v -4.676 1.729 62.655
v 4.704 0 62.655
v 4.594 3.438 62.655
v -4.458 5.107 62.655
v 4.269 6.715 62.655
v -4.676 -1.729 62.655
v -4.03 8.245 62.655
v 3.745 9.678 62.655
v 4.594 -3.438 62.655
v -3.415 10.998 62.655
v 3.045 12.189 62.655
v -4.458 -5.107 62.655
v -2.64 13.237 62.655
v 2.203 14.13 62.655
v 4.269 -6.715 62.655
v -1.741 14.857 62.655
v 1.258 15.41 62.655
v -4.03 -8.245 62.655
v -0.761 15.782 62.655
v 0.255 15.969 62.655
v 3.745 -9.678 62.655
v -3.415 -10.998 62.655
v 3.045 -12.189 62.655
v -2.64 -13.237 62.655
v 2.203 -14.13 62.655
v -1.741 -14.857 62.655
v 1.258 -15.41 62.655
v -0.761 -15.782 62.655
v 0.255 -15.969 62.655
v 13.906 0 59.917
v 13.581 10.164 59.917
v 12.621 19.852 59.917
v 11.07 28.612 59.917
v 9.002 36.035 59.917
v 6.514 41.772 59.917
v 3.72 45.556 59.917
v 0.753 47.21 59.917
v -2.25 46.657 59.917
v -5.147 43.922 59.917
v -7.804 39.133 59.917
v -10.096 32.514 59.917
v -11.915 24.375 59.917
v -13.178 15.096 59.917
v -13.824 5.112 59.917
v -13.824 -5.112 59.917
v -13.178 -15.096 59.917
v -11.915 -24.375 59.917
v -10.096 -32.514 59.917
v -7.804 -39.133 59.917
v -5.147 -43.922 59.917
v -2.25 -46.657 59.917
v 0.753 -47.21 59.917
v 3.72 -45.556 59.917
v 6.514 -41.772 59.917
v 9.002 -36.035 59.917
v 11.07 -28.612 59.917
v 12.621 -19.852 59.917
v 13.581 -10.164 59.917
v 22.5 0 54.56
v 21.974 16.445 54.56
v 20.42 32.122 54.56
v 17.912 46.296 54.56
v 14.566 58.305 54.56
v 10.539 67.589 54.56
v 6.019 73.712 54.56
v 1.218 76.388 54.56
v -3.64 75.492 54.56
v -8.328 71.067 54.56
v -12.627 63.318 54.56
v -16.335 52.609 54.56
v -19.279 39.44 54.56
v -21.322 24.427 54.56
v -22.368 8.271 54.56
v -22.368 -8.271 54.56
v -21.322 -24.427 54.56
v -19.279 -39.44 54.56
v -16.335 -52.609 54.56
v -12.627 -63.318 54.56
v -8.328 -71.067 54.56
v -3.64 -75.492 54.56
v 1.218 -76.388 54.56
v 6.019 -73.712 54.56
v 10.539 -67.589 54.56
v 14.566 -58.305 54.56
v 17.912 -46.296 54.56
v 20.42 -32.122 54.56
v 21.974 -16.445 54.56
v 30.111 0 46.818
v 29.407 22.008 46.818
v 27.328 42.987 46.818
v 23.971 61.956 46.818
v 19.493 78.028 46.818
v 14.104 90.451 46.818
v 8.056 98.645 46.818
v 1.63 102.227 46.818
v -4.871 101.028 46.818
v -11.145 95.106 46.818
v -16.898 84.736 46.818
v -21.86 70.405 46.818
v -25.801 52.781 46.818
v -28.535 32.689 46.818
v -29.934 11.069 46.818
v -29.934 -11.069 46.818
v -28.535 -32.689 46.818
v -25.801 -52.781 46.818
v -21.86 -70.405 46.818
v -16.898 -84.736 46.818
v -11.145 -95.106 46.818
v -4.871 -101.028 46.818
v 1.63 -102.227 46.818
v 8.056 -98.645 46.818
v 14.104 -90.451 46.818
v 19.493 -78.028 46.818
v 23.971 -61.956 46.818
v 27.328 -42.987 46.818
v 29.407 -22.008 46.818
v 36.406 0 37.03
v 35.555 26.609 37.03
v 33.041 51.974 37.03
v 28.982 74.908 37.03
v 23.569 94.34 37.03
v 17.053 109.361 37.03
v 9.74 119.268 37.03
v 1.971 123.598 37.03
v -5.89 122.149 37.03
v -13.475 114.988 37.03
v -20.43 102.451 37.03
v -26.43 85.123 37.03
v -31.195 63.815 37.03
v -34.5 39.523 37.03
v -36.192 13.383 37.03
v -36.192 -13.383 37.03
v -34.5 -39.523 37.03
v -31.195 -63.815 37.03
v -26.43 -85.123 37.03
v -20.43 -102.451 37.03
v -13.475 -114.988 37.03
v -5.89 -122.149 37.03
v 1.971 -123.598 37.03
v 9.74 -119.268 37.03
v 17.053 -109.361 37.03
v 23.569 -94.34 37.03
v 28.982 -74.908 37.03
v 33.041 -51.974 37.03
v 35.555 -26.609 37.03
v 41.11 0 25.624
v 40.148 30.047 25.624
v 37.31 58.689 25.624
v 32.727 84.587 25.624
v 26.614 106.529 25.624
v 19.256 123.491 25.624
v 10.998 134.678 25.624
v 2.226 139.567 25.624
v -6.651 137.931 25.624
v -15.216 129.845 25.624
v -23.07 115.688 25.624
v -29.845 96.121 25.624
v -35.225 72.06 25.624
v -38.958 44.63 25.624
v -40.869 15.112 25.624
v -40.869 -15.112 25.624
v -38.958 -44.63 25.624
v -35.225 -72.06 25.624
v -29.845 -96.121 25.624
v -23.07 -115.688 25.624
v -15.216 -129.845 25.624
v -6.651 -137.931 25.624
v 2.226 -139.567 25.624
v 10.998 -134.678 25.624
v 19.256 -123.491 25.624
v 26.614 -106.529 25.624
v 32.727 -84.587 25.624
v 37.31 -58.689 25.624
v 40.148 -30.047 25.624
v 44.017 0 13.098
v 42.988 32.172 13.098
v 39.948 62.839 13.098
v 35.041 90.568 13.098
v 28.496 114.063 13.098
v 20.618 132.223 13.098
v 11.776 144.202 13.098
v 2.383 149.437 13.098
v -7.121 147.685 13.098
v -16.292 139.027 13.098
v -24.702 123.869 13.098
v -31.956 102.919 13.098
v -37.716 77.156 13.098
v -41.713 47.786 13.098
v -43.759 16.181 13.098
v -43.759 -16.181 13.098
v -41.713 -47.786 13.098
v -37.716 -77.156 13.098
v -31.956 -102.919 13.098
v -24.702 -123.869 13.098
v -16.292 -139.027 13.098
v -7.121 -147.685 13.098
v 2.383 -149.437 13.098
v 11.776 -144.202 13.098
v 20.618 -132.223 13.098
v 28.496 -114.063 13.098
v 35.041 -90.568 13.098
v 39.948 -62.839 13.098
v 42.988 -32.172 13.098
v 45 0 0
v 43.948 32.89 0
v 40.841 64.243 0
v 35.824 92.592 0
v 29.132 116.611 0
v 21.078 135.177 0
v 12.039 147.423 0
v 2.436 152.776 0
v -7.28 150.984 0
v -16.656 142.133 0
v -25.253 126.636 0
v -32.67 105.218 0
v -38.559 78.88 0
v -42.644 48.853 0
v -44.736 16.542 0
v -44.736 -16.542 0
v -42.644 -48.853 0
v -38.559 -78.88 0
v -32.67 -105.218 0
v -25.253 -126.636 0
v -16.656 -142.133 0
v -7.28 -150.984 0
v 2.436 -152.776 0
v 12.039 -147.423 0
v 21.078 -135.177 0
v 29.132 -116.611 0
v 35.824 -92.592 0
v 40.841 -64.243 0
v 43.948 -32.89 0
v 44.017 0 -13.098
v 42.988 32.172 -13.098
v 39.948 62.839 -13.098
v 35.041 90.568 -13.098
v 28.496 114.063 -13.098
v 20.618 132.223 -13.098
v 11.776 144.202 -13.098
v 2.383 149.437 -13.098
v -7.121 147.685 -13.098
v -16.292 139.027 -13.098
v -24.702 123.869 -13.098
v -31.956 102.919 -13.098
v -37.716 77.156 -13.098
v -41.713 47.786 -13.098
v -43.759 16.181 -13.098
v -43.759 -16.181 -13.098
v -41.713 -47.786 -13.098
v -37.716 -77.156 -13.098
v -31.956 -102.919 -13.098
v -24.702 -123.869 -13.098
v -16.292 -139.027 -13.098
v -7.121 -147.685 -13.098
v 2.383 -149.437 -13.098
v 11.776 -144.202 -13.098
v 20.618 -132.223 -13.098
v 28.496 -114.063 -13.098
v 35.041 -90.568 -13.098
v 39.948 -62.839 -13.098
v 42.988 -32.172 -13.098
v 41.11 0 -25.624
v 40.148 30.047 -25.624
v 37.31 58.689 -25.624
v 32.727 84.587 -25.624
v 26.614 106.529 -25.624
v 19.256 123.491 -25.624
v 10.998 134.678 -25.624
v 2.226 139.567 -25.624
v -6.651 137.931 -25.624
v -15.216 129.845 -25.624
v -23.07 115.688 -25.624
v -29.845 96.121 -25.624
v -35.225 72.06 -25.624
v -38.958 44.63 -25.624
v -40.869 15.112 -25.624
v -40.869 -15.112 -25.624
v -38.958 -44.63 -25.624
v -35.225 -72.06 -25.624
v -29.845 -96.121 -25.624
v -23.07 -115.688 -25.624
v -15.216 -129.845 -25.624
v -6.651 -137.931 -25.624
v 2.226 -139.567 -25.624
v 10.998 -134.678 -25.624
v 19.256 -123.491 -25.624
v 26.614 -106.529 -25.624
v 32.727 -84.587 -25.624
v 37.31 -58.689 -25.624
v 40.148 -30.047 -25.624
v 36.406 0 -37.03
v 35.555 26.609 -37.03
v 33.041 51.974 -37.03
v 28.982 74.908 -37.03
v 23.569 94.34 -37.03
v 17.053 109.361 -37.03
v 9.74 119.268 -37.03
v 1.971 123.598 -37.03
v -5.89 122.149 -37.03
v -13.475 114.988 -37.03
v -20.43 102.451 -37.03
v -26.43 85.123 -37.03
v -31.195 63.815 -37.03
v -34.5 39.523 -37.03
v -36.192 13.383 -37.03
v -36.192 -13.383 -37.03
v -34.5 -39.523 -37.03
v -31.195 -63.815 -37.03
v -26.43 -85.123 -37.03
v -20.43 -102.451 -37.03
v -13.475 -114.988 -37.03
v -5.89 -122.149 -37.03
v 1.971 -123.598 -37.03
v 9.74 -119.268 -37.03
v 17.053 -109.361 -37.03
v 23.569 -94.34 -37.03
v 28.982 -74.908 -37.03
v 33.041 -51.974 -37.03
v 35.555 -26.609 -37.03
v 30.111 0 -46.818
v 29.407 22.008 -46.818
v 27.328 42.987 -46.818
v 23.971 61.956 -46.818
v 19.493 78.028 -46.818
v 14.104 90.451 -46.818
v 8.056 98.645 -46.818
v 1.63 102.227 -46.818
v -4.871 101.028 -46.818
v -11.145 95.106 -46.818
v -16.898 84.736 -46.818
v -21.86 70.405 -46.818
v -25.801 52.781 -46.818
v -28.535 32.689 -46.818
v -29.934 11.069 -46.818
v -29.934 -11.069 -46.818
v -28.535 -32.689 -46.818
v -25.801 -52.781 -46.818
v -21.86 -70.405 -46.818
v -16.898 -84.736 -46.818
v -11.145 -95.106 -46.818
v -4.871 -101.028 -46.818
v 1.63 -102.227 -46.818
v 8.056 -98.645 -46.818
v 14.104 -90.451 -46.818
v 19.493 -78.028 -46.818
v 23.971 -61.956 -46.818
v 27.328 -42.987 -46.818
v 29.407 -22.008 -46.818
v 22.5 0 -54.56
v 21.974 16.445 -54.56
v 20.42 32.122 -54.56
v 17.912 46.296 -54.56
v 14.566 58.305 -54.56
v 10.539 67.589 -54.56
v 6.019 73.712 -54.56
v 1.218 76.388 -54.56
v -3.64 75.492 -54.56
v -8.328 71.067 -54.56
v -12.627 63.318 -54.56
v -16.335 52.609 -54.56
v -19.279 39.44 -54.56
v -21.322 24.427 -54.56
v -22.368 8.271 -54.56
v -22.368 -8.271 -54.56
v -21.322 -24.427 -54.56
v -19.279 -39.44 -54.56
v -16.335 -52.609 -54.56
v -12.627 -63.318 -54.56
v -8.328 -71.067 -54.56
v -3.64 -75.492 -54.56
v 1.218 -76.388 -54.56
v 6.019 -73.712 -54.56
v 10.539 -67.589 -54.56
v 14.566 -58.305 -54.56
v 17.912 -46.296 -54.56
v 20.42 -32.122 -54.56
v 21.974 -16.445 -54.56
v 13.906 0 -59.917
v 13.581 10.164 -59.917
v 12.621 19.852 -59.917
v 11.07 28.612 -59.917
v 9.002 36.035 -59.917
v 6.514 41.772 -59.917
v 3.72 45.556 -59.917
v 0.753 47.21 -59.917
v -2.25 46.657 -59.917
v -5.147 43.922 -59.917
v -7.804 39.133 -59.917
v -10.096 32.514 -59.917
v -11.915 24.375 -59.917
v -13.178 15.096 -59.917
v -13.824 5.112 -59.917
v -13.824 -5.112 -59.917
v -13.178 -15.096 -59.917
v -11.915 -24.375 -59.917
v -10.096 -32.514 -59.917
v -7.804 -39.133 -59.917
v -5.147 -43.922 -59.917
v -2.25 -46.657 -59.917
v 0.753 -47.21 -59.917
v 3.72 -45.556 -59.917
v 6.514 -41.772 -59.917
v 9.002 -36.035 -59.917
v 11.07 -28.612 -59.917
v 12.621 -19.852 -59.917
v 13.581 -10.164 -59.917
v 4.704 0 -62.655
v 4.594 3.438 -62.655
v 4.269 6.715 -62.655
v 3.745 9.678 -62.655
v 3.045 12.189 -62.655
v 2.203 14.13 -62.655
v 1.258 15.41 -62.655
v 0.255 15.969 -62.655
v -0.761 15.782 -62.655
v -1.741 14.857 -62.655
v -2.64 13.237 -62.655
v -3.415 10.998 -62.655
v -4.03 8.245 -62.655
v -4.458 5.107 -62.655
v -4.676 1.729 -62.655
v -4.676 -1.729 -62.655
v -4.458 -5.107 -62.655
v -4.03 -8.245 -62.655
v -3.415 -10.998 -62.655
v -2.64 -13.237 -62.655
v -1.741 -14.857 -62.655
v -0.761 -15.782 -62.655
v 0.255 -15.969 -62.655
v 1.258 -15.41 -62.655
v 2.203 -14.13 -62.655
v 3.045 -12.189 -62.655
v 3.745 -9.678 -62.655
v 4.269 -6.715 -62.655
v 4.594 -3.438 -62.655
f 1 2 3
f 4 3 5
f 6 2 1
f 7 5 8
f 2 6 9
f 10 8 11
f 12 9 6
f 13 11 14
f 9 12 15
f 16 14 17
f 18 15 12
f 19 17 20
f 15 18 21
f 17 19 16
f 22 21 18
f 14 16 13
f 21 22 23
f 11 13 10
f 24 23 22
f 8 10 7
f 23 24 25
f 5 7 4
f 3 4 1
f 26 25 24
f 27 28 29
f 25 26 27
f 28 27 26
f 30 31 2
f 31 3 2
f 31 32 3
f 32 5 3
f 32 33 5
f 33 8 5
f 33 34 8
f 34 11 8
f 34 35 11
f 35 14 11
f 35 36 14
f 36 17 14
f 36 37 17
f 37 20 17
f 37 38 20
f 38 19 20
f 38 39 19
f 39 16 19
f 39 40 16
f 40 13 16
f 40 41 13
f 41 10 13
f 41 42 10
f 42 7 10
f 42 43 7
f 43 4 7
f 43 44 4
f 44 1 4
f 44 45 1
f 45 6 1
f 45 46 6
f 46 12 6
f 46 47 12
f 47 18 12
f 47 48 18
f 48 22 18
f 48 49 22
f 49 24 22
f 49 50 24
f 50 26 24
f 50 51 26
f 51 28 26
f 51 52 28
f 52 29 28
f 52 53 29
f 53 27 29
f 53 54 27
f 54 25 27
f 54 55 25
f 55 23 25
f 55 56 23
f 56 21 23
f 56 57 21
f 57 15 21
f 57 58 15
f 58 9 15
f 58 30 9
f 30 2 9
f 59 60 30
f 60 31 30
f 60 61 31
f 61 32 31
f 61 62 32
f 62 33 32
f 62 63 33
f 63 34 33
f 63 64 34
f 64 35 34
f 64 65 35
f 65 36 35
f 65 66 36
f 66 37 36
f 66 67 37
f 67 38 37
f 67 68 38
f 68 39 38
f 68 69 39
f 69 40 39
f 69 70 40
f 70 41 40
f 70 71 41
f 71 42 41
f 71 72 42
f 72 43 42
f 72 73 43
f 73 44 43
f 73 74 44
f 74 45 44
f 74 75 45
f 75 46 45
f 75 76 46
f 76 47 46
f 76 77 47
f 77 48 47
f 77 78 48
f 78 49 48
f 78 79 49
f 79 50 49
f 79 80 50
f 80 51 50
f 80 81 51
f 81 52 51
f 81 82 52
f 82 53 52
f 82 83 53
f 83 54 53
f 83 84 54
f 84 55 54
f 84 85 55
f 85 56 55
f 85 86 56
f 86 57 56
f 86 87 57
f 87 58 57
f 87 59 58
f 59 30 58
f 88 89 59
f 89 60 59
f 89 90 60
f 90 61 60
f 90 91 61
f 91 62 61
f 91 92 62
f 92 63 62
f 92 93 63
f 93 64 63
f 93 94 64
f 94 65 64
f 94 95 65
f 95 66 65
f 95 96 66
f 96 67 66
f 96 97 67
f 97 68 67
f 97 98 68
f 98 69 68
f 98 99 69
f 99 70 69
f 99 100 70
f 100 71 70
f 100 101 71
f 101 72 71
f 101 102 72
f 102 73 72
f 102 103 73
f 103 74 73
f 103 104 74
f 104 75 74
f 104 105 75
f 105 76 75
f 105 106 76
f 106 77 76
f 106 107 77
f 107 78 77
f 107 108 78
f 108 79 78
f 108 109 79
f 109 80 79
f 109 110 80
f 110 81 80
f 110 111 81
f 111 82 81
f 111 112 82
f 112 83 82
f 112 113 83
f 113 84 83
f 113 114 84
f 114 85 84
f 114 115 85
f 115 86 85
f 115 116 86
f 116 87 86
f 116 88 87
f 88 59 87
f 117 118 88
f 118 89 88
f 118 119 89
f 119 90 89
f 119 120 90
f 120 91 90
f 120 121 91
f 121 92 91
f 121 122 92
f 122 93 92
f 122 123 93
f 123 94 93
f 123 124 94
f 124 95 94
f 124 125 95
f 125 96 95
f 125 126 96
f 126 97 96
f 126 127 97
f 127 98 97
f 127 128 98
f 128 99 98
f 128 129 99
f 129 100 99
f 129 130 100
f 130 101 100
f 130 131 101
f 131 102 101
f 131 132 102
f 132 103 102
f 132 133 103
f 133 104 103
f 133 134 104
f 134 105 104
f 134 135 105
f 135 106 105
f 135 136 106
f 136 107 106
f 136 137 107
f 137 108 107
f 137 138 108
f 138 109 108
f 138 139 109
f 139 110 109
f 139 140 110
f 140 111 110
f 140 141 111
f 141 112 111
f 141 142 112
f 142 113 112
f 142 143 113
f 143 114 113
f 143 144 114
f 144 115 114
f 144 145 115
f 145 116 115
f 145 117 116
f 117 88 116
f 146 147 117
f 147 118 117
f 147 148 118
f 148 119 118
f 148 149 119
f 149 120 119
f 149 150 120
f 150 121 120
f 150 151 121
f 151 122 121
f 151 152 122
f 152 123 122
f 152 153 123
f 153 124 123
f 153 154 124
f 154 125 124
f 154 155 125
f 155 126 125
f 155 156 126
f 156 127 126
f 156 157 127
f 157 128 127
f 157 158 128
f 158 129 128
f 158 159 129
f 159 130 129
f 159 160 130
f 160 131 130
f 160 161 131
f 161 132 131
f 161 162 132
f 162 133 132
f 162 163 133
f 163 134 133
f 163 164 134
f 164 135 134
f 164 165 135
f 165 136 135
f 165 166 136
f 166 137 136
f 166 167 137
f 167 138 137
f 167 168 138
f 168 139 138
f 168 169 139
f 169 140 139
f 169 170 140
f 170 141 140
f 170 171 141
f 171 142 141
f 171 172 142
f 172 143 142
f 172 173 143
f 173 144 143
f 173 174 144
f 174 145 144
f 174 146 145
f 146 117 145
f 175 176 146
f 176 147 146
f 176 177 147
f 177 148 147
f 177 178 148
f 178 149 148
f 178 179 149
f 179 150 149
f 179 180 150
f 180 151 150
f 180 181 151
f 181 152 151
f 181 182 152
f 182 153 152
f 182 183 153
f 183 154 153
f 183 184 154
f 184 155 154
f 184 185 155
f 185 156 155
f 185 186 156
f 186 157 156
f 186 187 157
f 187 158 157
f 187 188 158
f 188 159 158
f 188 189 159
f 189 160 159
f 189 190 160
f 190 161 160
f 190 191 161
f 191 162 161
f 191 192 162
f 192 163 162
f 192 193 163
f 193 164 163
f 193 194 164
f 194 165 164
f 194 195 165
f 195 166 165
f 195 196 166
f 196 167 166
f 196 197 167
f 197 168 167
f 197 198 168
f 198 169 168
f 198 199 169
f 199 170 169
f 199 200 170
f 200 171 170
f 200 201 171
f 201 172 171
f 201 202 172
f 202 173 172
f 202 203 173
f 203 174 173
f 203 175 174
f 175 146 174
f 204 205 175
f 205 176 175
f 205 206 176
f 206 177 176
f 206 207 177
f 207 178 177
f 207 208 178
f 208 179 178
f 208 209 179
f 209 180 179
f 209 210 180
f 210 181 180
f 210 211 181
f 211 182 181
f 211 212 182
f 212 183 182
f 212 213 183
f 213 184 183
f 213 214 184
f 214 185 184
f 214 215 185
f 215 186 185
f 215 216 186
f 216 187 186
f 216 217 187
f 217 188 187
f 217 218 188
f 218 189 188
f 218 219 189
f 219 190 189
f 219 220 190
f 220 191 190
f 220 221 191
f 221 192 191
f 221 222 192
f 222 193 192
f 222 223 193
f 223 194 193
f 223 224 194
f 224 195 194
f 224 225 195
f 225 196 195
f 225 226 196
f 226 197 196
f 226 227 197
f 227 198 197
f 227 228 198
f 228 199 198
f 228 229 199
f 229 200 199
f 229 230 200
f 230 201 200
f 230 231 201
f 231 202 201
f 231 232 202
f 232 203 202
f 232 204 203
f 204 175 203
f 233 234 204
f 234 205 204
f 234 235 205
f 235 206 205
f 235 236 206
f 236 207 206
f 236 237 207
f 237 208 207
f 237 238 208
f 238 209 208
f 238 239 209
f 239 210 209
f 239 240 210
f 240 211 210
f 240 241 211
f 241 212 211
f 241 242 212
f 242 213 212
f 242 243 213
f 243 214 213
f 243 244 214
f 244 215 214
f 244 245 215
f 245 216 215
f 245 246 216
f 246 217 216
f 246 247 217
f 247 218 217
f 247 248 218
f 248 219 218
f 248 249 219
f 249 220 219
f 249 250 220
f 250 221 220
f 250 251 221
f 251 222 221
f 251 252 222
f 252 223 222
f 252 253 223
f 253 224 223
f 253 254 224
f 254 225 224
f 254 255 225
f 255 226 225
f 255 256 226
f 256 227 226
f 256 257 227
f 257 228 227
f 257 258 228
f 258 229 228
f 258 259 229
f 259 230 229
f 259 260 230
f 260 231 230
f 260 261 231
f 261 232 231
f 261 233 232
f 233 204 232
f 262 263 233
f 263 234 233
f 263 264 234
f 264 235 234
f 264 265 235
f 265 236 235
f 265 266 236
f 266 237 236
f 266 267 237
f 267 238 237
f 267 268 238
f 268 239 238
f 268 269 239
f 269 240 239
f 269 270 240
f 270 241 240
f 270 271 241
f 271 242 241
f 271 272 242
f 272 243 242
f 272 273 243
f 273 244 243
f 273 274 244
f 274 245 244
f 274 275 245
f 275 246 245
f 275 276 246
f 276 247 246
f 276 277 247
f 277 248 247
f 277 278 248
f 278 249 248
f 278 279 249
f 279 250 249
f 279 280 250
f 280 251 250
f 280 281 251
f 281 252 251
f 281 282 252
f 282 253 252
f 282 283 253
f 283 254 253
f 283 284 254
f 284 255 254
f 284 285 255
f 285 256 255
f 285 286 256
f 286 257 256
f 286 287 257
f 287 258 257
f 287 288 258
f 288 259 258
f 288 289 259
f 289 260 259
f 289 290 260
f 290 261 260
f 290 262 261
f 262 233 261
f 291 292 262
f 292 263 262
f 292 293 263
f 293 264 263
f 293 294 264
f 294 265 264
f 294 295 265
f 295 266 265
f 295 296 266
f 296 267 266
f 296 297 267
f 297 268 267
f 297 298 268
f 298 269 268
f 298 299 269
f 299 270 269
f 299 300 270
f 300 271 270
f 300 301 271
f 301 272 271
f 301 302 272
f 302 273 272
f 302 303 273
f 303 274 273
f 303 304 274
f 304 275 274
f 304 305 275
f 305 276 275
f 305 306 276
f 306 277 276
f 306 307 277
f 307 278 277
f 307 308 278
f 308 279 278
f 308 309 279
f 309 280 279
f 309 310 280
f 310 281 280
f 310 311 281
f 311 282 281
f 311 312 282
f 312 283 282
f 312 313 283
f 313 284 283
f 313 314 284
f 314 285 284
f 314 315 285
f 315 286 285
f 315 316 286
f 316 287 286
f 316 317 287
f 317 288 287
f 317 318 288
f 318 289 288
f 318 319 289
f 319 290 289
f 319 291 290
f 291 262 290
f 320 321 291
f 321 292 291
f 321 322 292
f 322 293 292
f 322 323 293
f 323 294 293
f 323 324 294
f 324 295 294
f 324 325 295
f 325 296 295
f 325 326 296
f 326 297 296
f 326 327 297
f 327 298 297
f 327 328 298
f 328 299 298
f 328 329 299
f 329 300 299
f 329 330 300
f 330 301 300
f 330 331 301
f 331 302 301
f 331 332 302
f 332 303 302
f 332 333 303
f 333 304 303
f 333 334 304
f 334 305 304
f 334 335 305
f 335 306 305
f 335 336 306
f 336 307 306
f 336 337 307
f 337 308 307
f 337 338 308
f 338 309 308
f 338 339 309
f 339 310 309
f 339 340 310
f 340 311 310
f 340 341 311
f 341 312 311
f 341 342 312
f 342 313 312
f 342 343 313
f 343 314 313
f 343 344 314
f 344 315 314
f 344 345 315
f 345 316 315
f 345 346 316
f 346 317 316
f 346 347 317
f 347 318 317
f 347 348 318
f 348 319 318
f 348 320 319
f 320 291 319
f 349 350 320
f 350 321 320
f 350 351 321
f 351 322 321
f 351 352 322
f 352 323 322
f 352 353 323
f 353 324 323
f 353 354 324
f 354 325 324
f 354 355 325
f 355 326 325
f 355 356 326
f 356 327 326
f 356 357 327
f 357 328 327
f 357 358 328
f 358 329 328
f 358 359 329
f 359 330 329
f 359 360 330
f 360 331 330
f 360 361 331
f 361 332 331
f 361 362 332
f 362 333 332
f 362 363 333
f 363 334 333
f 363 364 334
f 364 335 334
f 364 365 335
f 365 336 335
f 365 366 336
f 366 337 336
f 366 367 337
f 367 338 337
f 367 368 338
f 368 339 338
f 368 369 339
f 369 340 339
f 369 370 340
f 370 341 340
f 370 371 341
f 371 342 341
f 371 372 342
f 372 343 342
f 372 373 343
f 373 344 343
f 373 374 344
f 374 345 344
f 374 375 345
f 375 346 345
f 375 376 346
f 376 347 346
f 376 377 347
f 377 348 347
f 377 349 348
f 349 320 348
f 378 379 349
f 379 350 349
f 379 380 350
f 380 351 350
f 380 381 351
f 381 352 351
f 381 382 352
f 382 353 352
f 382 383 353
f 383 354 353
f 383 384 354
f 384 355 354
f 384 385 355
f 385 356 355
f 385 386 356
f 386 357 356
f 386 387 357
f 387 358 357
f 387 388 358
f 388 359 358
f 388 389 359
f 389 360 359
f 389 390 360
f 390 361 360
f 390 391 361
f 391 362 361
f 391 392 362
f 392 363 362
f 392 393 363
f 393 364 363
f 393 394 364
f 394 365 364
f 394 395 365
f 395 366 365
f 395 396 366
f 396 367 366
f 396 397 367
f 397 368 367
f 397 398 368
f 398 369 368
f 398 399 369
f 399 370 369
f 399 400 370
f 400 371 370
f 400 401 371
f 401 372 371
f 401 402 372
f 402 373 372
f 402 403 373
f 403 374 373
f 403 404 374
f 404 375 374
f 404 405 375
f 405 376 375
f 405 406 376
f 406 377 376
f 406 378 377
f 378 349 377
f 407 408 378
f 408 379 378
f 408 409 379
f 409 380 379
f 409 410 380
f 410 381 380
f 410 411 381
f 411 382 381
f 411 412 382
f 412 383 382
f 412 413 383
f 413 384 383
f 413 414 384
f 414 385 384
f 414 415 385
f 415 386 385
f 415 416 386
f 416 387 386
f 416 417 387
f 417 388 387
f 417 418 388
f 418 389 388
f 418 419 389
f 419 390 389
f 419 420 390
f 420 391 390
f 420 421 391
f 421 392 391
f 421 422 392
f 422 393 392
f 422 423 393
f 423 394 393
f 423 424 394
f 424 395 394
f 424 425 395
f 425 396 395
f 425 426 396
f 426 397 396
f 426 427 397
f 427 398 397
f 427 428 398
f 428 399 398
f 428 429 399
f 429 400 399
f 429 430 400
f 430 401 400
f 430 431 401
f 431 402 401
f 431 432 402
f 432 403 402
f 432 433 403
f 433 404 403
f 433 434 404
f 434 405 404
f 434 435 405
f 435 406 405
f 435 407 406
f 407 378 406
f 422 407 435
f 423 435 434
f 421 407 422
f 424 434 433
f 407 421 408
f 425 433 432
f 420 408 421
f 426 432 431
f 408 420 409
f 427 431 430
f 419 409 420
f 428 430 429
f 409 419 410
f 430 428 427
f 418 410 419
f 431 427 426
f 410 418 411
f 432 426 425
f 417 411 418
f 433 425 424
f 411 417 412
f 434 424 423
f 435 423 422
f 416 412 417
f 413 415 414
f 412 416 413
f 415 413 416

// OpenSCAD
// Generated by SolidPython 1.0.1 on 2020-07-29 00:46:46


scale(v = [5, 17, 7]) {
	sphere(r = 9);
}
/***********************************************
*********      SolidPython code:      **********
************************************************
 
# import packages: SolidPython
from solid import *
from solid.utils import *
from itertools import chain, combinations, permutations


class Resize:

    def __init__(self, scad_file):
        self.scad_file = scad_file
        #self.scad_file = import_scad(scad_file)
        # cone/cylinder param:
        self.r1 = 0
        self.r2 = 0
        self.h = 0
        # rectangular prism param:
        self.w = 0
        self.l = 0
        # ellipse param:
        self.r = 0

    # import OpenScad code (file name corresponds to shape)


    # classify shape + parameters
    def assign(self, param1, param2, param3):
        if self.scad_file == 'cone.scad':
            self.r1 = param1
            self.r2 = param2
            self.h = param3
        elif self.scad_file == 'cylinder.scad':
            self.r1 = param1
            self.r2 = param2
            self.h = param3
        elif self.scad_file == 'rectangularPrism.scad':
            self.h = param1
            self.l = param2
            self.w = param3
        else:
            self.r = param1
            self.h = param2

    # resize parameters
    def iterate(self):
        x = range(3, 20, 2)
        i = 1
        if self.scad_file == 'cone.scad':
            tempList = list(permutations(x, 2))
            for temp in tempList:
                param1 = temp[0]
                param2 = temp[1]
                filepath = 'produced_scad_files/' + 'cone' + str(param1) + '_' + str(param2) + '_' + '.scad'
                scad_render_to_file(cylinder(h=param1, r1=param2, r2=0), filepath)

        elif self.scad_file == 'cylinder.scad':
            tempList = list(permutations(x, 3))
            for temp in tempList:
                param1 = temp[0]
                param2 = temp[1]
                filepath = 'produced_scad_files/' + 'cylinder' + str(param1) + '_' + str(param2) + '_' + '.scad'
                scad_render_to_file(cylinder(h=param1, r1=param2, r2=param2), filepath)

        elif self.scad_file == 'rectangularPrism.scad':
            tempList = list(permutations(x, 3))
            for temp in tempList:
                param1 = temp[0]
                param2 = temp[1]
                param3 = temp[2]
                filepath = 'produced_scad_files/' + 'rectangularPrism' + str(param1) + '_' + str(param2) + '_' + str(
                    param3) + '.scad'
                scad_render_to_file(cube(size=(param1, param2, param3)), filepath)

        elif self.scad_file == 'ellipse.scad':
            tempList = list(permutations(x, 4))
            for temp in tempList:
                param1 = temp[0]
                param2 = temp[1]
                param3 = temp[2]
                param4 = temp[3]
                filepath = 'produced_scad_files/' + 'ellipse' + str(param1) + '_' + str(param2) + '_' + str(param3) + '_' + str(param4) + '.scad'
                scad_render_to_file(scale([param1, param2, param3])(sphere(r=param4)), filepath)

    def render_to_scadfile(self):
        scad_render_to_file(scad, 'example.scad') 
 
************************************************/
